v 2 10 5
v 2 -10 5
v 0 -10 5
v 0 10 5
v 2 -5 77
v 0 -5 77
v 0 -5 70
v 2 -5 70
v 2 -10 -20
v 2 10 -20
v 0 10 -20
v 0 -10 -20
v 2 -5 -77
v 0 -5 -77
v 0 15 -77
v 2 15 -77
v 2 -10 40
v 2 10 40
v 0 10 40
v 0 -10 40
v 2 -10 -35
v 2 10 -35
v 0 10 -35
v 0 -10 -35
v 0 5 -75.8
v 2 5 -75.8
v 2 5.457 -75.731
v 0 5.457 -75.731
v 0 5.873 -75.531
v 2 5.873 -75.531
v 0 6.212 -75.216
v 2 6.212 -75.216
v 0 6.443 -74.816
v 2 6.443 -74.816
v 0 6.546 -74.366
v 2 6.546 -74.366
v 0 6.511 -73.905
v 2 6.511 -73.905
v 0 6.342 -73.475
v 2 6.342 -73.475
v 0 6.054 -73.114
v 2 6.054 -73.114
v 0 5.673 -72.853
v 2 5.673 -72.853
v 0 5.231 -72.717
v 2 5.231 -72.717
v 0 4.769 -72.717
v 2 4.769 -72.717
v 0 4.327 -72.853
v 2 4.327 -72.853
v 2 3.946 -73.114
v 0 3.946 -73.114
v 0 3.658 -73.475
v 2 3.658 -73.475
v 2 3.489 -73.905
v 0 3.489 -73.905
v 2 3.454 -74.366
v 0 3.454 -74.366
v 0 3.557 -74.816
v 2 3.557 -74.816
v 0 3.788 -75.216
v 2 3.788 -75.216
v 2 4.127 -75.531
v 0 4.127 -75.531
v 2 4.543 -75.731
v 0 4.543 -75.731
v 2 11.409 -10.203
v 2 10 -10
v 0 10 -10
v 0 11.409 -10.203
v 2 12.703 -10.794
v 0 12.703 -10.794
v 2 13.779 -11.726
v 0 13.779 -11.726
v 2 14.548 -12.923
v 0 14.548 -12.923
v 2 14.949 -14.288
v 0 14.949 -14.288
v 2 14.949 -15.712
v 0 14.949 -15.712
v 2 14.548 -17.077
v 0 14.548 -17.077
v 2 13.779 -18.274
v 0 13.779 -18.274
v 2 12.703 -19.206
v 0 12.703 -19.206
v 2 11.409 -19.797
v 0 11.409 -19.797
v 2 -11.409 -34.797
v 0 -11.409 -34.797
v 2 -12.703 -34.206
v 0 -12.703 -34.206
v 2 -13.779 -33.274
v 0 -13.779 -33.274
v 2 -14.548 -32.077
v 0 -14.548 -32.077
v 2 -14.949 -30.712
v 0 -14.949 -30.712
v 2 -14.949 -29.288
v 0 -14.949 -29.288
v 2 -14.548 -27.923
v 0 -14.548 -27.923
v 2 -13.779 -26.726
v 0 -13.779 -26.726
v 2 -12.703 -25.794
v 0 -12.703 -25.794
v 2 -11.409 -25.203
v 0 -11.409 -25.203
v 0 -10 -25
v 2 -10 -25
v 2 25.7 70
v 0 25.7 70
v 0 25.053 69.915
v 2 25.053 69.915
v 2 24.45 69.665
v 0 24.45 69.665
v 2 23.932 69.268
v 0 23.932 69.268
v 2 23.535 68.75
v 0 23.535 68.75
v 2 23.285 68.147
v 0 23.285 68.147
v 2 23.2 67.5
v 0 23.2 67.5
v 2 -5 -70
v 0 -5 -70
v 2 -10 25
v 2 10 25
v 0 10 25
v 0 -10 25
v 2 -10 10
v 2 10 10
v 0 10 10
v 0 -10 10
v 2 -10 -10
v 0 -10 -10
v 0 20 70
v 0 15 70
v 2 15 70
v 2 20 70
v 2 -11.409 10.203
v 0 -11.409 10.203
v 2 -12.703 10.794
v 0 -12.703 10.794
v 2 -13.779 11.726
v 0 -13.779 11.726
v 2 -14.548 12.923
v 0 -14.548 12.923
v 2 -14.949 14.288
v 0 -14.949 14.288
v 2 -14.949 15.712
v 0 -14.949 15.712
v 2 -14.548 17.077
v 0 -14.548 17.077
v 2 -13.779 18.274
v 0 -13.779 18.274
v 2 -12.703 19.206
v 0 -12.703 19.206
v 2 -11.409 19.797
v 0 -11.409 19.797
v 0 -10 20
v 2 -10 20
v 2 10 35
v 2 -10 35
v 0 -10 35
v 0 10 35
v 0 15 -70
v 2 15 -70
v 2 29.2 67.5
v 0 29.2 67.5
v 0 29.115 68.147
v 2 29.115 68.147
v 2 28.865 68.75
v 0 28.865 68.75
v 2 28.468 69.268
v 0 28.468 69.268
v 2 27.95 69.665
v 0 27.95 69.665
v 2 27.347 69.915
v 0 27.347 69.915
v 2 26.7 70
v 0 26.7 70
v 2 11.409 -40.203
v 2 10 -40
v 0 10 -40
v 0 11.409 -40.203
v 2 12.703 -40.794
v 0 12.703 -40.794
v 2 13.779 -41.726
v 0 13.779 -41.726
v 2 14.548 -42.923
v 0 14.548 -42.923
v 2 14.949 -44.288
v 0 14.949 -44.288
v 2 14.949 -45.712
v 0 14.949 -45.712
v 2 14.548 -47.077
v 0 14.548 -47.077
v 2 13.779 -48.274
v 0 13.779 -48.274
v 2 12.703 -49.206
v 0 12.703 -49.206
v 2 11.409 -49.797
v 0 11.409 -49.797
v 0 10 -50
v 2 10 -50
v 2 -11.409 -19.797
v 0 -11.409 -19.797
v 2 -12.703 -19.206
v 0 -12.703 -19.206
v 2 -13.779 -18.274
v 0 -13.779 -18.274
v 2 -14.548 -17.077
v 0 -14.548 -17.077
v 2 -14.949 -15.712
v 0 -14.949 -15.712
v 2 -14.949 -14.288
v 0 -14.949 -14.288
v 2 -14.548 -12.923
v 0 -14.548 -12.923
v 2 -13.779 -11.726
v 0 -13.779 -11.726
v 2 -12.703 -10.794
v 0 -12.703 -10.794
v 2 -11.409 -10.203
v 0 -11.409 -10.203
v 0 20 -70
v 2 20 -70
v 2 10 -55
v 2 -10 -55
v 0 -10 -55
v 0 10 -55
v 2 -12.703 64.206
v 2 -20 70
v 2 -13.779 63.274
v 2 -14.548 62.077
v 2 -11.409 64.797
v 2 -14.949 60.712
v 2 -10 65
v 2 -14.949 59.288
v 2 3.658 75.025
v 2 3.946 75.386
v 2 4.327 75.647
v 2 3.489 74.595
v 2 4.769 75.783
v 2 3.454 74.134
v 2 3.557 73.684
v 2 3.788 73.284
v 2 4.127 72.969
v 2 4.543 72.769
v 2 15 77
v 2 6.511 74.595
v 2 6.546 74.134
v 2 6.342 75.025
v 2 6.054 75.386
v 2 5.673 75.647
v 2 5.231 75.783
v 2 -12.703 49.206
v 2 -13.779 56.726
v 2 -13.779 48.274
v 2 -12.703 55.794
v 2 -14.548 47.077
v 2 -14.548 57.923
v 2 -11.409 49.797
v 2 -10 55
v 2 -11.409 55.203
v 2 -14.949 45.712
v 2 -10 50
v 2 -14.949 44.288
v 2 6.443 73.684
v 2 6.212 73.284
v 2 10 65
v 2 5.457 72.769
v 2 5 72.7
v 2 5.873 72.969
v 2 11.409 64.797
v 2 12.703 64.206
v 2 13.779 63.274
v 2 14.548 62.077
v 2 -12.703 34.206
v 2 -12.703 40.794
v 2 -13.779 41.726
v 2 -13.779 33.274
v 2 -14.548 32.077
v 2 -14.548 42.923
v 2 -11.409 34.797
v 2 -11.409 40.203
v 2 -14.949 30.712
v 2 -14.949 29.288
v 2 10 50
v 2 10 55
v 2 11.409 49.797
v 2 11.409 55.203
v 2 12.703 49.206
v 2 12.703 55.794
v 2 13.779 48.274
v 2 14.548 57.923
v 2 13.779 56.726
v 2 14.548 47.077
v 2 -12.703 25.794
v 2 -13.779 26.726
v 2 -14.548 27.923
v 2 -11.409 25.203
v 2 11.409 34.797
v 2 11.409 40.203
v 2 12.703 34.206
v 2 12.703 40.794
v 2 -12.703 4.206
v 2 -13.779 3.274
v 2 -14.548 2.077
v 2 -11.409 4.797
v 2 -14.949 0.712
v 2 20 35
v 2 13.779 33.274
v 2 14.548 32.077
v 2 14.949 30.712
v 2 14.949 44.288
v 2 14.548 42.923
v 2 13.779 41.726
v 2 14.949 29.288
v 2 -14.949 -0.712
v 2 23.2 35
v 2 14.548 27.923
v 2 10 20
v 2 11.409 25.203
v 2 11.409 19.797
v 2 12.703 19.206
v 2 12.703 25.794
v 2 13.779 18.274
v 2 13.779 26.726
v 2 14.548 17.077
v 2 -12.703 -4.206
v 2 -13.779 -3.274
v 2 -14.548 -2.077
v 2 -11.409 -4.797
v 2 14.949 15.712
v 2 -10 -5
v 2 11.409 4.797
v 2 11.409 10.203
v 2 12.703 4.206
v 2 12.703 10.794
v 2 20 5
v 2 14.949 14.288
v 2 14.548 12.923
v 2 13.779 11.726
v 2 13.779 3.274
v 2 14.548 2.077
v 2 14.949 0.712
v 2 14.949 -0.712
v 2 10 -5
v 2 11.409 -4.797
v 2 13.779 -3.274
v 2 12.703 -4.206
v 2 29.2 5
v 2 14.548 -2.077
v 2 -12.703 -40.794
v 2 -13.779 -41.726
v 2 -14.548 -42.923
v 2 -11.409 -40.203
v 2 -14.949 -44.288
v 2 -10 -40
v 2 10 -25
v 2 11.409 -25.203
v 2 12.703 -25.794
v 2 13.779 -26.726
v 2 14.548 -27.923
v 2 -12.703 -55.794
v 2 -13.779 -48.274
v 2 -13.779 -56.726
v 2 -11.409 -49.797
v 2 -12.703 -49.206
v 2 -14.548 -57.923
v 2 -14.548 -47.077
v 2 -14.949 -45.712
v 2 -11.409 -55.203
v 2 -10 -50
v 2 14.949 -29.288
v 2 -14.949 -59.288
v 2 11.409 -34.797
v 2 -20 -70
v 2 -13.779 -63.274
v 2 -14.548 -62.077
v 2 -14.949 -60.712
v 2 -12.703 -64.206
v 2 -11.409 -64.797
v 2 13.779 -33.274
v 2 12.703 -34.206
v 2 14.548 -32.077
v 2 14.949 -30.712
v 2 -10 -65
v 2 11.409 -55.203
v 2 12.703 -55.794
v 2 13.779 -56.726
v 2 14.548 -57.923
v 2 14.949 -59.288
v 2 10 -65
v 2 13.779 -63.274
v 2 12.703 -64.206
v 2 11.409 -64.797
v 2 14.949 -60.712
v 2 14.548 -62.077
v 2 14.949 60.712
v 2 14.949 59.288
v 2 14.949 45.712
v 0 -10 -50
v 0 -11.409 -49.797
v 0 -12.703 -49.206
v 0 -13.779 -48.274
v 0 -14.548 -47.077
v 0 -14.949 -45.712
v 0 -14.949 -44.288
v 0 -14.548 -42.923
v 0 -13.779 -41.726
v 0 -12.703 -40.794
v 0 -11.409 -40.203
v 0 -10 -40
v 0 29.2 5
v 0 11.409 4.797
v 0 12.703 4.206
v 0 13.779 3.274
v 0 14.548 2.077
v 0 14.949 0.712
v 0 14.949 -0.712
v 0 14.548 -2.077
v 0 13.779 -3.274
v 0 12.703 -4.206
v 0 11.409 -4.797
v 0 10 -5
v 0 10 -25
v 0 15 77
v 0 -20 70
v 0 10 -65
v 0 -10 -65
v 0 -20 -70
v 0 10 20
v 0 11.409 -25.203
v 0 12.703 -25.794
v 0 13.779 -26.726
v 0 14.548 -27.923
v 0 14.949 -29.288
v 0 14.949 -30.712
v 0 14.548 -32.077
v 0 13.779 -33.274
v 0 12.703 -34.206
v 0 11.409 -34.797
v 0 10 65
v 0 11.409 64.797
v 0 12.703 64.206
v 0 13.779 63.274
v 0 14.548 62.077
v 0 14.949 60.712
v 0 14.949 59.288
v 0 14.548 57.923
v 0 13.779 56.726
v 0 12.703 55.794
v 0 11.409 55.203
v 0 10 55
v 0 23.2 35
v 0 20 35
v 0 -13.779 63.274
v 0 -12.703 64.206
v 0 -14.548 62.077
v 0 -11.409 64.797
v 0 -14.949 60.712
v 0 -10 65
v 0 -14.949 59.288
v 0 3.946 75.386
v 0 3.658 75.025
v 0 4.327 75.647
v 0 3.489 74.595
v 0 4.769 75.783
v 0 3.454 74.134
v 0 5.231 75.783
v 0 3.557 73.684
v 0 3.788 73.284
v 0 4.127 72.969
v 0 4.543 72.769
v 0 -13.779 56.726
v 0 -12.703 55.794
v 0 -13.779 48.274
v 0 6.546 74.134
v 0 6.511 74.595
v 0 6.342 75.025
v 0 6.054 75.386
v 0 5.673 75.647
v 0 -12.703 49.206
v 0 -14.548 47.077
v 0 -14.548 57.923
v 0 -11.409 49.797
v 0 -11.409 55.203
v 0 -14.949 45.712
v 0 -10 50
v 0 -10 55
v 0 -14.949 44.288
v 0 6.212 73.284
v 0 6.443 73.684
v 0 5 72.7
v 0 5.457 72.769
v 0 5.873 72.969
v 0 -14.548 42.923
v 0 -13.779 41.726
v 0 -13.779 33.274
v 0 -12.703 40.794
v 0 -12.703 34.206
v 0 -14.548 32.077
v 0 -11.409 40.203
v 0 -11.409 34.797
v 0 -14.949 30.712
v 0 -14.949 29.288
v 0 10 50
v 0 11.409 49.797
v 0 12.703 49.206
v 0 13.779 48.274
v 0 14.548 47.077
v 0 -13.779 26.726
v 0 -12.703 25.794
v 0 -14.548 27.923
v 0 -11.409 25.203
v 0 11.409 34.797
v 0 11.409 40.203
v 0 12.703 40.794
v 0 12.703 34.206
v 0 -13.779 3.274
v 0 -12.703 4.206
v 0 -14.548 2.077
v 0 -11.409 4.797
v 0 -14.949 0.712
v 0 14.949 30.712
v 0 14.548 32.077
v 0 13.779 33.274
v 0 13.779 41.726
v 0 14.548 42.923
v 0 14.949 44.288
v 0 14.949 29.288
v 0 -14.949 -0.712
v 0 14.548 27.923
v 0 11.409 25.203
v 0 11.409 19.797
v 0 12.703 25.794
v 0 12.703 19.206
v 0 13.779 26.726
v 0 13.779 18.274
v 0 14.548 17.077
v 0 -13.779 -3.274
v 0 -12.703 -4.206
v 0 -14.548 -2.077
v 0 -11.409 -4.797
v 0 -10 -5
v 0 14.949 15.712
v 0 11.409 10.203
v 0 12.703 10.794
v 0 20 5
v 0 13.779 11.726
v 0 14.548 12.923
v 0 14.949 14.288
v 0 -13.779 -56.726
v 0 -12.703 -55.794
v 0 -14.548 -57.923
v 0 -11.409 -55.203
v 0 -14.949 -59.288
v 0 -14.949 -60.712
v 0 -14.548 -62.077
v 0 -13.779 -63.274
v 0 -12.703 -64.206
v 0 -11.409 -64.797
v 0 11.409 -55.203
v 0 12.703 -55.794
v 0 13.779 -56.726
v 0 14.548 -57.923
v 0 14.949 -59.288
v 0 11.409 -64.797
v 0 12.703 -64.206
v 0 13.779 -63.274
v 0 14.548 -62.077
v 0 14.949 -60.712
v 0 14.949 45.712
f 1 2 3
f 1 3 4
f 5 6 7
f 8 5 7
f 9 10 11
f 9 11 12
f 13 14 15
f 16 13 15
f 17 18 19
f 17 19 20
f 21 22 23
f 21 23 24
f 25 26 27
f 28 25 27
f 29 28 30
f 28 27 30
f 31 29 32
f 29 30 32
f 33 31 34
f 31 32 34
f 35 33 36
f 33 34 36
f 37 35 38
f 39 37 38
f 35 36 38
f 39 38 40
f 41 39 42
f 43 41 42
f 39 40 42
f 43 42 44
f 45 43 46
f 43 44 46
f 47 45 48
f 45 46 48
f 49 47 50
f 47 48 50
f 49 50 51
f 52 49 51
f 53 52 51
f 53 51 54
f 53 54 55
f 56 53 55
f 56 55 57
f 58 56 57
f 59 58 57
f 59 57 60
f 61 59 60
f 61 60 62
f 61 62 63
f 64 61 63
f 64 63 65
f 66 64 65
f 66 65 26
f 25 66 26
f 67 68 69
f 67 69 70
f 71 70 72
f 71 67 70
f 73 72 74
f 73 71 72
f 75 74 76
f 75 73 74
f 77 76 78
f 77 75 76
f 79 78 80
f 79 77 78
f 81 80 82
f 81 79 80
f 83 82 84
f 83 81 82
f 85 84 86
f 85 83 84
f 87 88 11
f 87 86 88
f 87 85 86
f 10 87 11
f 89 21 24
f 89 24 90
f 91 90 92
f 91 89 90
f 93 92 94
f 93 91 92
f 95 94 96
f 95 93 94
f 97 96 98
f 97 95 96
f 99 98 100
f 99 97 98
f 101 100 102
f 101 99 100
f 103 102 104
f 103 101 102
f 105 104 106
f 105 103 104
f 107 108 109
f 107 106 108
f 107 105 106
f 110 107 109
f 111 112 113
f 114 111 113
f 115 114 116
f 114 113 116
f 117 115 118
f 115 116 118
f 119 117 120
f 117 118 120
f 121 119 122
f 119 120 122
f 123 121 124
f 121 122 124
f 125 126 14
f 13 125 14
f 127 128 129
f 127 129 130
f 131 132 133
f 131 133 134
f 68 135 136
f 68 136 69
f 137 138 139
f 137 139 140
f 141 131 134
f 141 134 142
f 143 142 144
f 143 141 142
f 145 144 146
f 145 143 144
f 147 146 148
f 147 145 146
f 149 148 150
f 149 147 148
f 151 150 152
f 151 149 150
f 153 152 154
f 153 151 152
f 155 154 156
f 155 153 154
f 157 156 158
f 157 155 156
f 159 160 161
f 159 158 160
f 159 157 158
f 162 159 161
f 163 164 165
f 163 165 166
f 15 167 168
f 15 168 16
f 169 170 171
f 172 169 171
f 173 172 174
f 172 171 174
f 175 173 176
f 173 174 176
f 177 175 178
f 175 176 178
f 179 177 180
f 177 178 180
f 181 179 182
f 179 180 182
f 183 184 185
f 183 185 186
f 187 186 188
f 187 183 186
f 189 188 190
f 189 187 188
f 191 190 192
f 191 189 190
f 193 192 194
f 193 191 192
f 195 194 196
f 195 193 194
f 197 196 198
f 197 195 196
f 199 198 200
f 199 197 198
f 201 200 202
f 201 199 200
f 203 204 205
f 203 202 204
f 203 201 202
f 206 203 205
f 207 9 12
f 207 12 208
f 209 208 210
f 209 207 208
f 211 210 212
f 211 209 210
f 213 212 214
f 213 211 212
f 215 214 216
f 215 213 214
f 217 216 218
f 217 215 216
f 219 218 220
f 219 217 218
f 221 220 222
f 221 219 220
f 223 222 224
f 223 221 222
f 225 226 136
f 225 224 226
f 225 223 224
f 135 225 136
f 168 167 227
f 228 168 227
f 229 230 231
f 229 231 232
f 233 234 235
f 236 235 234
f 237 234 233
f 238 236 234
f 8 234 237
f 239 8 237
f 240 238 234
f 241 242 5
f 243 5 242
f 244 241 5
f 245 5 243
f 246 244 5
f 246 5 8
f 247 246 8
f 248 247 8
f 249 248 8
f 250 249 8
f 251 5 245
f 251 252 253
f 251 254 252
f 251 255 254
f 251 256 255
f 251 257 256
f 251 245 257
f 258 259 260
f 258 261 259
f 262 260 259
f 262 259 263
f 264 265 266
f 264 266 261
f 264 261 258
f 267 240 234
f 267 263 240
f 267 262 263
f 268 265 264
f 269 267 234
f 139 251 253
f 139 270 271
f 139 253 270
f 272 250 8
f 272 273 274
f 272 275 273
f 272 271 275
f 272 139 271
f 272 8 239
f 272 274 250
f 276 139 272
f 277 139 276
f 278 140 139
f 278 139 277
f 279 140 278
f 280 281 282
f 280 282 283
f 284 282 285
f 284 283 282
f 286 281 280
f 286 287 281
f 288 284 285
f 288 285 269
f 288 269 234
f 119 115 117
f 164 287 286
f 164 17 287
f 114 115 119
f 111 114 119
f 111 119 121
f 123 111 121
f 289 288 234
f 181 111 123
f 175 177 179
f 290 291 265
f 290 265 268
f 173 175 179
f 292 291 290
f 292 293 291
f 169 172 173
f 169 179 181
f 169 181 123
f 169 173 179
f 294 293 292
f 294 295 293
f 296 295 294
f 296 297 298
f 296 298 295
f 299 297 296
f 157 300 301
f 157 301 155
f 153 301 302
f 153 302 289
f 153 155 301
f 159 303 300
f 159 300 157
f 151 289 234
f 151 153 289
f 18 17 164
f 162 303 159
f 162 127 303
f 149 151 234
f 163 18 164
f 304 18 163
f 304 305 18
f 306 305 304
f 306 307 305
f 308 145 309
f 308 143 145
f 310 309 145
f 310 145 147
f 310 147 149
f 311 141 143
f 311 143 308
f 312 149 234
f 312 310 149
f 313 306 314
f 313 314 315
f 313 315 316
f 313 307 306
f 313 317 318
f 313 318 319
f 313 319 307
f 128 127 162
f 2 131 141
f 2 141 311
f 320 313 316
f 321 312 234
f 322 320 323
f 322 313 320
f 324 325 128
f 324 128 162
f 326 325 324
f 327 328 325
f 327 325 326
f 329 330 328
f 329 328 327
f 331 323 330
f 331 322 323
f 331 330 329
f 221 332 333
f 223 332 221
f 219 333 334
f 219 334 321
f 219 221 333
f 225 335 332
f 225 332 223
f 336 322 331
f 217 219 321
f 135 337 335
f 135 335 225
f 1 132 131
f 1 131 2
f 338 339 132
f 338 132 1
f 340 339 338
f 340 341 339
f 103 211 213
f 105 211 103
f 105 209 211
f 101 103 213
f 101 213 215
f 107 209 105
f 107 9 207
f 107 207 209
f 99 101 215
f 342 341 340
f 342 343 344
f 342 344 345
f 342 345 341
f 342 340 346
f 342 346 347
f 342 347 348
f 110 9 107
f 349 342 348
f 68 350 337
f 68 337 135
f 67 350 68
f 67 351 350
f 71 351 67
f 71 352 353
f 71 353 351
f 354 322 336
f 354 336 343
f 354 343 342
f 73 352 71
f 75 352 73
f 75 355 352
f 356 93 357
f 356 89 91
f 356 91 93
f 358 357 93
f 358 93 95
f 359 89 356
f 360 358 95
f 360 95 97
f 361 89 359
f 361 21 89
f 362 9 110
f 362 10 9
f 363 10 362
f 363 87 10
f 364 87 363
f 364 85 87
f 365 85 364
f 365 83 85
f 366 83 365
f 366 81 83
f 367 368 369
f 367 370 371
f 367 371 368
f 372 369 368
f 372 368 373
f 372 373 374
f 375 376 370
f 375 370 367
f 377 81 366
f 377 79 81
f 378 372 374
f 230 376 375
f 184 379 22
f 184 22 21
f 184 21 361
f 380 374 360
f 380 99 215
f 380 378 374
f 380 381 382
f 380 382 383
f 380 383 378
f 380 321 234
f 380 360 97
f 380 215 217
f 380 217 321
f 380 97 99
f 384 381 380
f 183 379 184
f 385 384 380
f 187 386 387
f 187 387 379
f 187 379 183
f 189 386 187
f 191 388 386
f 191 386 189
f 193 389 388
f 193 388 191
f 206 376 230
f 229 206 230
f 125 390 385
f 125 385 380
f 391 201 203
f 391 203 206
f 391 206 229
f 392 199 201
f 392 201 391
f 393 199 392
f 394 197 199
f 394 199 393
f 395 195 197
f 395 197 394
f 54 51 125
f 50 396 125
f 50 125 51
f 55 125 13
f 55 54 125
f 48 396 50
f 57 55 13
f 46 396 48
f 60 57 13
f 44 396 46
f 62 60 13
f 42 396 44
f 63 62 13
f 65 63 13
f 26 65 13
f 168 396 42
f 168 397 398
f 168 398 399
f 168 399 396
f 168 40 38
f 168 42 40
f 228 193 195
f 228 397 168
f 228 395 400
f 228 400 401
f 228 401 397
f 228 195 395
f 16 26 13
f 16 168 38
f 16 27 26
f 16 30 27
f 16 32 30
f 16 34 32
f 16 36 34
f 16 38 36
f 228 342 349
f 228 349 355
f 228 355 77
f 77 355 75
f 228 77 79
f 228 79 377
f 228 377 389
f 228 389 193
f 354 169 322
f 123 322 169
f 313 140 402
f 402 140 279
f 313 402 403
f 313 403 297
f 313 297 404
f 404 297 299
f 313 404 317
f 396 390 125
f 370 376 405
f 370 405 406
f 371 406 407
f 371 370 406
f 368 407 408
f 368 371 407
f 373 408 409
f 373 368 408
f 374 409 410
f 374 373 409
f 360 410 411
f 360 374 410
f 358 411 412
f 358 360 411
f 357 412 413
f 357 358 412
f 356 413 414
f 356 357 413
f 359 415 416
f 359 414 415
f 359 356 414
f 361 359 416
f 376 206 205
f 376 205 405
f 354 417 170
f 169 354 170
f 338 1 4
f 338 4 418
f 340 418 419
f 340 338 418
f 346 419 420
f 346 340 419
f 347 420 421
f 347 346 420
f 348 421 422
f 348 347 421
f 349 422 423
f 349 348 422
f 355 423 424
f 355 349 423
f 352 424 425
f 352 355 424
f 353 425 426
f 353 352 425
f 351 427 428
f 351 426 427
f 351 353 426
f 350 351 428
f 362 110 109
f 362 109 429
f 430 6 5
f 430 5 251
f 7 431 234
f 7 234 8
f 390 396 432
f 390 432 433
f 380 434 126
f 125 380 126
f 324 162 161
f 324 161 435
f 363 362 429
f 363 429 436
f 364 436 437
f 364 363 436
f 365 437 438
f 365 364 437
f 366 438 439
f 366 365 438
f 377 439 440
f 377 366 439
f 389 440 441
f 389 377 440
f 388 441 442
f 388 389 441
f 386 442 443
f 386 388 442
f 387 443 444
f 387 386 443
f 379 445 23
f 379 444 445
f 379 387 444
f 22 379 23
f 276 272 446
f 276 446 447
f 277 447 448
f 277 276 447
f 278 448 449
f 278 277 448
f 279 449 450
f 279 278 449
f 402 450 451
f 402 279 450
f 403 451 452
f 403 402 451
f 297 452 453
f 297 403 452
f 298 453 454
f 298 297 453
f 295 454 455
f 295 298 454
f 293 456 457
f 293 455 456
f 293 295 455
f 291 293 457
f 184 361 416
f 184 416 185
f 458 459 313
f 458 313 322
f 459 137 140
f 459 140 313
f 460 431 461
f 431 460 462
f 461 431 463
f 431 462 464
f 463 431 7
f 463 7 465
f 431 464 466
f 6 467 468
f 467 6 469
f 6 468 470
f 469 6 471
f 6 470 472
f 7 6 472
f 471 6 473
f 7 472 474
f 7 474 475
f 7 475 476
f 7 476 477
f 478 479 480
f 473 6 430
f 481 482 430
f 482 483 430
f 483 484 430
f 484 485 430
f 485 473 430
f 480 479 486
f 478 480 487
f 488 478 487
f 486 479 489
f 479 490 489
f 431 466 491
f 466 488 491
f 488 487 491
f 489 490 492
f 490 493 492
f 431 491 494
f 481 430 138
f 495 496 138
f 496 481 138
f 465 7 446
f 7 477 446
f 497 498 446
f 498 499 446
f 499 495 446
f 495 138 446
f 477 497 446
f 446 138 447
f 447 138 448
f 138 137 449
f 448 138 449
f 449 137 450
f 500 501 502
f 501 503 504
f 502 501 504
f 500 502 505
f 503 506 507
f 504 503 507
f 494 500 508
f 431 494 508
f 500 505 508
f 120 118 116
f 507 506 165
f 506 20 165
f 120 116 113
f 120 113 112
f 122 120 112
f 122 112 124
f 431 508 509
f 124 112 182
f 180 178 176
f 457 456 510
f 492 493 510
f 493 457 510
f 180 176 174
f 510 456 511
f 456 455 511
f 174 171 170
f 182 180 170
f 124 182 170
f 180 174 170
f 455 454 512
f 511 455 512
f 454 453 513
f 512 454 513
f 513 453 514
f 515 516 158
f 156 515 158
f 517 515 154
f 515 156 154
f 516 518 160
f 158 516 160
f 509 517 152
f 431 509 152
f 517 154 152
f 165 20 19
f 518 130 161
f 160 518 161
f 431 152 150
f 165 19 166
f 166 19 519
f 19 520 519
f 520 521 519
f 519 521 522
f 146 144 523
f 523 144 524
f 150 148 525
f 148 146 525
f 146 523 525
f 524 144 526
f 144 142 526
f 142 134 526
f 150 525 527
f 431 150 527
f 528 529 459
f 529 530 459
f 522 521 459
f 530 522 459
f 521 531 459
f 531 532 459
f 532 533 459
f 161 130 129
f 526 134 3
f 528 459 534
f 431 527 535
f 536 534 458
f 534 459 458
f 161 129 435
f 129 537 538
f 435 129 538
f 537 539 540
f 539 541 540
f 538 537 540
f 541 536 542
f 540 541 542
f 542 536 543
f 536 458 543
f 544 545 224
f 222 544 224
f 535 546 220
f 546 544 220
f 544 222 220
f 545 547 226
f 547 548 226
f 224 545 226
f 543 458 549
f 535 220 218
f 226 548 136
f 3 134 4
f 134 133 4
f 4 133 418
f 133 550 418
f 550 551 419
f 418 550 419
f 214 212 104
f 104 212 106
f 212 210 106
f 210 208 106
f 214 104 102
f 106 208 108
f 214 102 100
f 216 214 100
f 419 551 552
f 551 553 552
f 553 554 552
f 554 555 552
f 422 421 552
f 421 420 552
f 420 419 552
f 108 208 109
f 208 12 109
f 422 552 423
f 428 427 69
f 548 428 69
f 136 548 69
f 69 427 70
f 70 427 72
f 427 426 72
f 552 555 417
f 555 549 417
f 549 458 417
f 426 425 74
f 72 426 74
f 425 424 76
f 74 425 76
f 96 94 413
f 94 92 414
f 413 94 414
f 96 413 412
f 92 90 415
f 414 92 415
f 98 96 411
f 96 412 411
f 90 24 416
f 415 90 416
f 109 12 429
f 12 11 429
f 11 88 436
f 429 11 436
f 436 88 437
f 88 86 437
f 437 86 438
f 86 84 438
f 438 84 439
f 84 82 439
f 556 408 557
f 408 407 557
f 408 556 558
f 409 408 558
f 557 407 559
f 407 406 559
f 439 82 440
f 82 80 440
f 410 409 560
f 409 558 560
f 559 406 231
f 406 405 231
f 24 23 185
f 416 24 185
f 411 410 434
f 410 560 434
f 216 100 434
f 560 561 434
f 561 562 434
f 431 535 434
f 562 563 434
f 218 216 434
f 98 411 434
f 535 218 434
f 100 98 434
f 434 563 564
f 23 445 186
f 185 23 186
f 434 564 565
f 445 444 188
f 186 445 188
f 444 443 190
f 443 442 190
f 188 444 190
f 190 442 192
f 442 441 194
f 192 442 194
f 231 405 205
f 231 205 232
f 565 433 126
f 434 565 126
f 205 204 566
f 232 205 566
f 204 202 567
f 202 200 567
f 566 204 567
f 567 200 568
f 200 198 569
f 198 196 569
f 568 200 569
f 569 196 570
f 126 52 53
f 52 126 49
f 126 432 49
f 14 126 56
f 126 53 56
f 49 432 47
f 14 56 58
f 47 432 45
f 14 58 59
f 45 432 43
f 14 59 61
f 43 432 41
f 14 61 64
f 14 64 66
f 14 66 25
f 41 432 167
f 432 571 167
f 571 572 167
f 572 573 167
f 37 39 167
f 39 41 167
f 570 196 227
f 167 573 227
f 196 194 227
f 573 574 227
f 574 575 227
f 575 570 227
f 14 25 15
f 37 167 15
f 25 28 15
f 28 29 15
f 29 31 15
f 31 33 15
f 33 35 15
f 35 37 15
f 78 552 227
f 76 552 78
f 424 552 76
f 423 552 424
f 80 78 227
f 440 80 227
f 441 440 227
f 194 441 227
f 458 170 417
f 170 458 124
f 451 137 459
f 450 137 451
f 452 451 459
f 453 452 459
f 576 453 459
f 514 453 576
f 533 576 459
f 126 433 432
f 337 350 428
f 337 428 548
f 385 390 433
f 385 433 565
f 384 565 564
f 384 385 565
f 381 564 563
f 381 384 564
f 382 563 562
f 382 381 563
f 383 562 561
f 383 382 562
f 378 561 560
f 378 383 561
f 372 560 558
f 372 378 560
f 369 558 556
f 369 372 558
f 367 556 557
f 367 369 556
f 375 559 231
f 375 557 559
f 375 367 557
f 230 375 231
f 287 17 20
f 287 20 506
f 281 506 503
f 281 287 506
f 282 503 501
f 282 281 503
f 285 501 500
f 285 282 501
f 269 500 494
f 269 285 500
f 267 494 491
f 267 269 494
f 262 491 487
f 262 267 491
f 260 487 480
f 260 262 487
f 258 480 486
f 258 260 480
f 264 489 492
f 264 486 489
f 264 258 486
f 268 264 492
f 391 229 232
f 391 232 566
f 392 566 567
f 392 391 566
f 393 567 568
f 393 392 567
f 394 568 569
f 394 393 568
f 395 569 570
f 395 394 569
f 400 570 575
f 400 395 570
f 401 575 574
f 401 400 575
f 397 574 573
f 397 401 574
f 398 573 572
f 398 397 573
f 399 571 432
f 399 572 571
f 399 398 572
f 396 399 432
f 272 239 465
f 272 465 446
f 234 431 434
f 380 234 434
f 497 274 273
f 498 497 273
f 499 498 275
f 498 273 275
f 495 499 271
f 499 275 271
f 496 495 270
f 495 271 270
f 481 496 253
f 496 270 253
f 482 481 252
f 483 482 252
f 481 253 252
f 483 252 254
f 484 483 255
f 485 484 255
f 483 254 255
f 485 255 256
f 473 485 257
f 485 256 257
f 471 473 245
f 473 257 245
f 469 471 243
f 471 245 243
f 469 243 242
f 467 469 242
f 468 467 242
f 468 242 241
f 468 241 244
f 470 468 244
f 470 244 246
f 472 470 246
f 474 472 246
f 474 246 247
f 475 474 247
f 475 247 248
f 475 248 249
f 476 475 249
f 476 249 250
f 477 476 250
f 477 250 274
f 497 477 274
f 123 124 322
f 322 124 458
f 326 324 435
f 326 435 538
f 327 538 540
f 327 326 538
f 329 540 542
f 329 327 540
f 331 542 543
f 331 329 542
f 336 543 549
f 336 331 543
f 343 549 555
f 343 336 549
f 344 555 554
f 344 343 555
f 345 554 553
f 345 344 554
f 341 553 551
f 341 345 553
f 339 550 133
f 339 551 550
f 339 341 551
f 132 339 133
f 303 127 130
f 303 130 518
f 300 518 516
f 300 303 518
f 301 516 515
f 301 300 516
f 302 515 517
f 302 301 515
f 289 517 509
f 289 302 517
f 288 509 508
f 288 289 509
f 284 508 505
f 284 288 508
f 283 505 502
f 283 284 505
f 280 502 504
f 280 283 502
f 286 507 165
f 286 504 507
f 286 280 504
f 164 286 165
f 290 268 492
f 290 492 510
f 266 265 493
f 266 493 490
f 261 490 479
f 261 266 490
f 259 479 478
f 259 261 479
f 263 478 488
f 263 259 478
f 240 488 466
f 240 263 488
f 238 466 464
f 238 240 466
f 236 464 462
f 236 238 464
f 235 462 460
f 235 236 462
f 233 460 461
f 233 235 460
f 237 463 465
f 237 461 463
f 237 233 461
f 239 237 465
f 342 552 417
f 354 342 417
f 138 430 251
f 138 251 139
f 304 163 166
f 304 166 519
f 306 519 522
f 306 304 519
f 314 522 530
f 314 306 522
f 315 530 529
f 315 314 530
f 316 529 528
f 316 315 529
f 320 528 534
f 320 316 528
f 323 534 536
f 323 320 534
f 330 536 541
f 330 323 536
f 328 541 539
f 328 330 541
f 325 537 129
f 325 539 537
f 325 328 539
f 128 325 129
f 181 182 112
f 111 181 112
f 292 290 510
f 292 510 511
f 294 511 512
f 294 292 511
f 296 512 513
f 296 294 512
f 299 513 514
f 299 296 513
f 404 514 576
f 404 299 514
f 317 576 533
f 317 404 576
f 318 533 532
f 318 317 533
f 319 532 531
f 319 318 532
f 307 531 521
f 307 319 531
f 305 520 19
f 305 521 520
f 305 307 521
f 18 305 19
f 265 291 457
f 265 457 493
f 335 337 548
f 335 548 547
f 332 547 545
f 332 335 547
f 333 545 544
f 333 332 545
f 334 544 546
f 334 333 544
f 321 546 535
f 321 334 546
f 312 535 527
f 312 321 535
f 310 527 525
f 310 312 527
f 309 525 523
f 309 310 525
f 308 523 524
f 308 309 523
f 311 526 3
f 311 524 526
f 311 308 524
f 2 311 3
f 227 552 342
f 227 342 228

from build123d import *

# Parameters (mm, degrees)
SKETCH_1_W          = 140
SKETCH_1_H          = 40
SKETCH_1_W_2        = 7
SKETCH_1_H_2        = 20
SKETCH_1_W_3        = 30
SKETCH_1_H_3        = 3.2
EXTRUDE_1_DEPTH     = 2
CUT_EXTRUDE_1_DEPTH = 3
SKETCH_3_R          = 1.55
CUT_EXTRUDE_2_DEPTH = 3


with BuildPart() as part:
    # 草图1 → 凸台-拉伸1 (new body)
    with BuildSketch(Plane(origin=(0, 0, 0), x_dir=(0, 0, -1), z_dir=(1, 0, 0))):
        Rectangle(SKETCH_1_W, SKETCH_1_H)
        with Locations((-73.5, 5)):
            Rectangle(SKETCH_1_W_2, SKETCH_1_H_2)
        with BuildLine():
            Line((-67.5, 23.2), (-35, 23.2))
            Line((-35, 23.2), (-5, 23.2))
            Line((-5, 23.2), (-5, 29.2))
            Line((-5, 29.2), (-67.5, 29.2))
            ThreePointArc((-67.5, 29.2), (-69.267766953, 28.467766953), (-70, 26.7))
            Line((-70, 26.7), (-70, 25.7))
            ThreePointArc((-70, 25.7), (-69.267766953, 23.932233047), (-67.5, 23.2))
        make_face()
        with Locations((-20, 21.6)):
            Rectangle(SKETCH_1_W_3, SKETCH_1_H_3)
        with Locations((73.5, 5)):
            Rectangle(SKETCH_1_W_2, SKETCH_1_H_2)
    extrude(amount=EXTRUDE_1_DEPTH)

    # 草图2 → 切除-拉伸1 (cut)
    with BuildSketch(Plane(origin=(2, 0, 0), x_dir=(0, 0, -1), z_dir=(1, 0, 0))):
        with BuildLine():
            Line((-65, -10), (-65, 10))
            ThreePointArc((-65, 10), (-60, 15), (-55, 10))
            Line((-55, 10), (-55, -10))
            ThreePointArc((-55, -10), (-60, -15), (-65, -10))
        make_face()
        with BuildLine():
            Line((-50, -10), (-50, 10))
            ThreePointArc((-50, 10), (-45, 15), (-40, 10))
            Line((-40, 10), (-40, -10))
            ThreePointArc((-40, -10), (-45, -15), (-50, -10))
        make_face()
        with BuildLine():
            Line((-35, -10), (-35, 10))
            ThreePointArc((-35, 10), (-30, 15), (-25, 10))
            Line((-25, 10), (-25, -10))
            ThreePointArc((-25, -10), (-30, -15), (-35, -10))
        make_face()
        with BuildLine():
            Line((-20, -10), (-20, 10))
            ThreePointArc((-20, 10), (-15, 15), (-10, 10))
            Line((-10, 10), (-10, -10))
            ThreePointArc((-10, -10), (-15, -15), (-20, -10))
        make_face()
        with BuildLine():
            Line((-5, -10), (-5, 10))
            ThreePointArc((-5, 10), (0, 15), (5, 10))
            Line((5, 10), (5, -10))
            ThreePointArc((5, -10), (0, -15), (-5, -10))
        make_face()
        with BuildLine():
            Line((10, -10), (10, 10))
            ThreePointArc((10, 10), (15, 15), (20, 10))
            Line((20, 10), (20, -10))
            ThreePointArc((20, -10), (15, -15), (10, -10))
        make_face()
        with BuildLine():
            Line((25, -10), (25, 10))
            ThreePointArc((25, 10), (30, 15), (35, 10))
            Line((35, 10), (35, -10))
            ThreePointArc((35, -10), (30, -15), (25, -10))
        make_face()
        with BuildLine():
            Line((40, -10), (40, 10))
            ThreePointArc((40, 10), (45, 15), (50, 10))
            Line((50, 10), (50, -10))
            ThreePointArc((50, -10), (45, -15), (40, -10))
        make_face()
        with BuildLine():
            Line((55, -10), (55, 10))
            ThreePointArc((55, 10), (60, 15), (65, 10))
            Line((65, 10), (65, -10))
            ThreePointArc((65, -10), (60, -15), (55, -10))
        make_face()
    extrude(amount=-CUT_EXTRUDE_1_DEPTH, mode=Mode.SUBTRACT)

    # 草图3 → 切除-拉伸2 (cut)
    with BuildSketch(Plane(origin=(2, 0, 0), x_dir=(0, 0, -1), z_dir=(1, 0, 0))):
        with Locations((-74.25, 5)):
            Circle(SKETCH_3_R)
        with Locations((74.25, 5)):
            Circle(SKETCH_3_R)
    extrude(amount=-CUT_EXTRUDE_2_DEPTH, mode=Mode.SUBTRACT)


solid = part.part
